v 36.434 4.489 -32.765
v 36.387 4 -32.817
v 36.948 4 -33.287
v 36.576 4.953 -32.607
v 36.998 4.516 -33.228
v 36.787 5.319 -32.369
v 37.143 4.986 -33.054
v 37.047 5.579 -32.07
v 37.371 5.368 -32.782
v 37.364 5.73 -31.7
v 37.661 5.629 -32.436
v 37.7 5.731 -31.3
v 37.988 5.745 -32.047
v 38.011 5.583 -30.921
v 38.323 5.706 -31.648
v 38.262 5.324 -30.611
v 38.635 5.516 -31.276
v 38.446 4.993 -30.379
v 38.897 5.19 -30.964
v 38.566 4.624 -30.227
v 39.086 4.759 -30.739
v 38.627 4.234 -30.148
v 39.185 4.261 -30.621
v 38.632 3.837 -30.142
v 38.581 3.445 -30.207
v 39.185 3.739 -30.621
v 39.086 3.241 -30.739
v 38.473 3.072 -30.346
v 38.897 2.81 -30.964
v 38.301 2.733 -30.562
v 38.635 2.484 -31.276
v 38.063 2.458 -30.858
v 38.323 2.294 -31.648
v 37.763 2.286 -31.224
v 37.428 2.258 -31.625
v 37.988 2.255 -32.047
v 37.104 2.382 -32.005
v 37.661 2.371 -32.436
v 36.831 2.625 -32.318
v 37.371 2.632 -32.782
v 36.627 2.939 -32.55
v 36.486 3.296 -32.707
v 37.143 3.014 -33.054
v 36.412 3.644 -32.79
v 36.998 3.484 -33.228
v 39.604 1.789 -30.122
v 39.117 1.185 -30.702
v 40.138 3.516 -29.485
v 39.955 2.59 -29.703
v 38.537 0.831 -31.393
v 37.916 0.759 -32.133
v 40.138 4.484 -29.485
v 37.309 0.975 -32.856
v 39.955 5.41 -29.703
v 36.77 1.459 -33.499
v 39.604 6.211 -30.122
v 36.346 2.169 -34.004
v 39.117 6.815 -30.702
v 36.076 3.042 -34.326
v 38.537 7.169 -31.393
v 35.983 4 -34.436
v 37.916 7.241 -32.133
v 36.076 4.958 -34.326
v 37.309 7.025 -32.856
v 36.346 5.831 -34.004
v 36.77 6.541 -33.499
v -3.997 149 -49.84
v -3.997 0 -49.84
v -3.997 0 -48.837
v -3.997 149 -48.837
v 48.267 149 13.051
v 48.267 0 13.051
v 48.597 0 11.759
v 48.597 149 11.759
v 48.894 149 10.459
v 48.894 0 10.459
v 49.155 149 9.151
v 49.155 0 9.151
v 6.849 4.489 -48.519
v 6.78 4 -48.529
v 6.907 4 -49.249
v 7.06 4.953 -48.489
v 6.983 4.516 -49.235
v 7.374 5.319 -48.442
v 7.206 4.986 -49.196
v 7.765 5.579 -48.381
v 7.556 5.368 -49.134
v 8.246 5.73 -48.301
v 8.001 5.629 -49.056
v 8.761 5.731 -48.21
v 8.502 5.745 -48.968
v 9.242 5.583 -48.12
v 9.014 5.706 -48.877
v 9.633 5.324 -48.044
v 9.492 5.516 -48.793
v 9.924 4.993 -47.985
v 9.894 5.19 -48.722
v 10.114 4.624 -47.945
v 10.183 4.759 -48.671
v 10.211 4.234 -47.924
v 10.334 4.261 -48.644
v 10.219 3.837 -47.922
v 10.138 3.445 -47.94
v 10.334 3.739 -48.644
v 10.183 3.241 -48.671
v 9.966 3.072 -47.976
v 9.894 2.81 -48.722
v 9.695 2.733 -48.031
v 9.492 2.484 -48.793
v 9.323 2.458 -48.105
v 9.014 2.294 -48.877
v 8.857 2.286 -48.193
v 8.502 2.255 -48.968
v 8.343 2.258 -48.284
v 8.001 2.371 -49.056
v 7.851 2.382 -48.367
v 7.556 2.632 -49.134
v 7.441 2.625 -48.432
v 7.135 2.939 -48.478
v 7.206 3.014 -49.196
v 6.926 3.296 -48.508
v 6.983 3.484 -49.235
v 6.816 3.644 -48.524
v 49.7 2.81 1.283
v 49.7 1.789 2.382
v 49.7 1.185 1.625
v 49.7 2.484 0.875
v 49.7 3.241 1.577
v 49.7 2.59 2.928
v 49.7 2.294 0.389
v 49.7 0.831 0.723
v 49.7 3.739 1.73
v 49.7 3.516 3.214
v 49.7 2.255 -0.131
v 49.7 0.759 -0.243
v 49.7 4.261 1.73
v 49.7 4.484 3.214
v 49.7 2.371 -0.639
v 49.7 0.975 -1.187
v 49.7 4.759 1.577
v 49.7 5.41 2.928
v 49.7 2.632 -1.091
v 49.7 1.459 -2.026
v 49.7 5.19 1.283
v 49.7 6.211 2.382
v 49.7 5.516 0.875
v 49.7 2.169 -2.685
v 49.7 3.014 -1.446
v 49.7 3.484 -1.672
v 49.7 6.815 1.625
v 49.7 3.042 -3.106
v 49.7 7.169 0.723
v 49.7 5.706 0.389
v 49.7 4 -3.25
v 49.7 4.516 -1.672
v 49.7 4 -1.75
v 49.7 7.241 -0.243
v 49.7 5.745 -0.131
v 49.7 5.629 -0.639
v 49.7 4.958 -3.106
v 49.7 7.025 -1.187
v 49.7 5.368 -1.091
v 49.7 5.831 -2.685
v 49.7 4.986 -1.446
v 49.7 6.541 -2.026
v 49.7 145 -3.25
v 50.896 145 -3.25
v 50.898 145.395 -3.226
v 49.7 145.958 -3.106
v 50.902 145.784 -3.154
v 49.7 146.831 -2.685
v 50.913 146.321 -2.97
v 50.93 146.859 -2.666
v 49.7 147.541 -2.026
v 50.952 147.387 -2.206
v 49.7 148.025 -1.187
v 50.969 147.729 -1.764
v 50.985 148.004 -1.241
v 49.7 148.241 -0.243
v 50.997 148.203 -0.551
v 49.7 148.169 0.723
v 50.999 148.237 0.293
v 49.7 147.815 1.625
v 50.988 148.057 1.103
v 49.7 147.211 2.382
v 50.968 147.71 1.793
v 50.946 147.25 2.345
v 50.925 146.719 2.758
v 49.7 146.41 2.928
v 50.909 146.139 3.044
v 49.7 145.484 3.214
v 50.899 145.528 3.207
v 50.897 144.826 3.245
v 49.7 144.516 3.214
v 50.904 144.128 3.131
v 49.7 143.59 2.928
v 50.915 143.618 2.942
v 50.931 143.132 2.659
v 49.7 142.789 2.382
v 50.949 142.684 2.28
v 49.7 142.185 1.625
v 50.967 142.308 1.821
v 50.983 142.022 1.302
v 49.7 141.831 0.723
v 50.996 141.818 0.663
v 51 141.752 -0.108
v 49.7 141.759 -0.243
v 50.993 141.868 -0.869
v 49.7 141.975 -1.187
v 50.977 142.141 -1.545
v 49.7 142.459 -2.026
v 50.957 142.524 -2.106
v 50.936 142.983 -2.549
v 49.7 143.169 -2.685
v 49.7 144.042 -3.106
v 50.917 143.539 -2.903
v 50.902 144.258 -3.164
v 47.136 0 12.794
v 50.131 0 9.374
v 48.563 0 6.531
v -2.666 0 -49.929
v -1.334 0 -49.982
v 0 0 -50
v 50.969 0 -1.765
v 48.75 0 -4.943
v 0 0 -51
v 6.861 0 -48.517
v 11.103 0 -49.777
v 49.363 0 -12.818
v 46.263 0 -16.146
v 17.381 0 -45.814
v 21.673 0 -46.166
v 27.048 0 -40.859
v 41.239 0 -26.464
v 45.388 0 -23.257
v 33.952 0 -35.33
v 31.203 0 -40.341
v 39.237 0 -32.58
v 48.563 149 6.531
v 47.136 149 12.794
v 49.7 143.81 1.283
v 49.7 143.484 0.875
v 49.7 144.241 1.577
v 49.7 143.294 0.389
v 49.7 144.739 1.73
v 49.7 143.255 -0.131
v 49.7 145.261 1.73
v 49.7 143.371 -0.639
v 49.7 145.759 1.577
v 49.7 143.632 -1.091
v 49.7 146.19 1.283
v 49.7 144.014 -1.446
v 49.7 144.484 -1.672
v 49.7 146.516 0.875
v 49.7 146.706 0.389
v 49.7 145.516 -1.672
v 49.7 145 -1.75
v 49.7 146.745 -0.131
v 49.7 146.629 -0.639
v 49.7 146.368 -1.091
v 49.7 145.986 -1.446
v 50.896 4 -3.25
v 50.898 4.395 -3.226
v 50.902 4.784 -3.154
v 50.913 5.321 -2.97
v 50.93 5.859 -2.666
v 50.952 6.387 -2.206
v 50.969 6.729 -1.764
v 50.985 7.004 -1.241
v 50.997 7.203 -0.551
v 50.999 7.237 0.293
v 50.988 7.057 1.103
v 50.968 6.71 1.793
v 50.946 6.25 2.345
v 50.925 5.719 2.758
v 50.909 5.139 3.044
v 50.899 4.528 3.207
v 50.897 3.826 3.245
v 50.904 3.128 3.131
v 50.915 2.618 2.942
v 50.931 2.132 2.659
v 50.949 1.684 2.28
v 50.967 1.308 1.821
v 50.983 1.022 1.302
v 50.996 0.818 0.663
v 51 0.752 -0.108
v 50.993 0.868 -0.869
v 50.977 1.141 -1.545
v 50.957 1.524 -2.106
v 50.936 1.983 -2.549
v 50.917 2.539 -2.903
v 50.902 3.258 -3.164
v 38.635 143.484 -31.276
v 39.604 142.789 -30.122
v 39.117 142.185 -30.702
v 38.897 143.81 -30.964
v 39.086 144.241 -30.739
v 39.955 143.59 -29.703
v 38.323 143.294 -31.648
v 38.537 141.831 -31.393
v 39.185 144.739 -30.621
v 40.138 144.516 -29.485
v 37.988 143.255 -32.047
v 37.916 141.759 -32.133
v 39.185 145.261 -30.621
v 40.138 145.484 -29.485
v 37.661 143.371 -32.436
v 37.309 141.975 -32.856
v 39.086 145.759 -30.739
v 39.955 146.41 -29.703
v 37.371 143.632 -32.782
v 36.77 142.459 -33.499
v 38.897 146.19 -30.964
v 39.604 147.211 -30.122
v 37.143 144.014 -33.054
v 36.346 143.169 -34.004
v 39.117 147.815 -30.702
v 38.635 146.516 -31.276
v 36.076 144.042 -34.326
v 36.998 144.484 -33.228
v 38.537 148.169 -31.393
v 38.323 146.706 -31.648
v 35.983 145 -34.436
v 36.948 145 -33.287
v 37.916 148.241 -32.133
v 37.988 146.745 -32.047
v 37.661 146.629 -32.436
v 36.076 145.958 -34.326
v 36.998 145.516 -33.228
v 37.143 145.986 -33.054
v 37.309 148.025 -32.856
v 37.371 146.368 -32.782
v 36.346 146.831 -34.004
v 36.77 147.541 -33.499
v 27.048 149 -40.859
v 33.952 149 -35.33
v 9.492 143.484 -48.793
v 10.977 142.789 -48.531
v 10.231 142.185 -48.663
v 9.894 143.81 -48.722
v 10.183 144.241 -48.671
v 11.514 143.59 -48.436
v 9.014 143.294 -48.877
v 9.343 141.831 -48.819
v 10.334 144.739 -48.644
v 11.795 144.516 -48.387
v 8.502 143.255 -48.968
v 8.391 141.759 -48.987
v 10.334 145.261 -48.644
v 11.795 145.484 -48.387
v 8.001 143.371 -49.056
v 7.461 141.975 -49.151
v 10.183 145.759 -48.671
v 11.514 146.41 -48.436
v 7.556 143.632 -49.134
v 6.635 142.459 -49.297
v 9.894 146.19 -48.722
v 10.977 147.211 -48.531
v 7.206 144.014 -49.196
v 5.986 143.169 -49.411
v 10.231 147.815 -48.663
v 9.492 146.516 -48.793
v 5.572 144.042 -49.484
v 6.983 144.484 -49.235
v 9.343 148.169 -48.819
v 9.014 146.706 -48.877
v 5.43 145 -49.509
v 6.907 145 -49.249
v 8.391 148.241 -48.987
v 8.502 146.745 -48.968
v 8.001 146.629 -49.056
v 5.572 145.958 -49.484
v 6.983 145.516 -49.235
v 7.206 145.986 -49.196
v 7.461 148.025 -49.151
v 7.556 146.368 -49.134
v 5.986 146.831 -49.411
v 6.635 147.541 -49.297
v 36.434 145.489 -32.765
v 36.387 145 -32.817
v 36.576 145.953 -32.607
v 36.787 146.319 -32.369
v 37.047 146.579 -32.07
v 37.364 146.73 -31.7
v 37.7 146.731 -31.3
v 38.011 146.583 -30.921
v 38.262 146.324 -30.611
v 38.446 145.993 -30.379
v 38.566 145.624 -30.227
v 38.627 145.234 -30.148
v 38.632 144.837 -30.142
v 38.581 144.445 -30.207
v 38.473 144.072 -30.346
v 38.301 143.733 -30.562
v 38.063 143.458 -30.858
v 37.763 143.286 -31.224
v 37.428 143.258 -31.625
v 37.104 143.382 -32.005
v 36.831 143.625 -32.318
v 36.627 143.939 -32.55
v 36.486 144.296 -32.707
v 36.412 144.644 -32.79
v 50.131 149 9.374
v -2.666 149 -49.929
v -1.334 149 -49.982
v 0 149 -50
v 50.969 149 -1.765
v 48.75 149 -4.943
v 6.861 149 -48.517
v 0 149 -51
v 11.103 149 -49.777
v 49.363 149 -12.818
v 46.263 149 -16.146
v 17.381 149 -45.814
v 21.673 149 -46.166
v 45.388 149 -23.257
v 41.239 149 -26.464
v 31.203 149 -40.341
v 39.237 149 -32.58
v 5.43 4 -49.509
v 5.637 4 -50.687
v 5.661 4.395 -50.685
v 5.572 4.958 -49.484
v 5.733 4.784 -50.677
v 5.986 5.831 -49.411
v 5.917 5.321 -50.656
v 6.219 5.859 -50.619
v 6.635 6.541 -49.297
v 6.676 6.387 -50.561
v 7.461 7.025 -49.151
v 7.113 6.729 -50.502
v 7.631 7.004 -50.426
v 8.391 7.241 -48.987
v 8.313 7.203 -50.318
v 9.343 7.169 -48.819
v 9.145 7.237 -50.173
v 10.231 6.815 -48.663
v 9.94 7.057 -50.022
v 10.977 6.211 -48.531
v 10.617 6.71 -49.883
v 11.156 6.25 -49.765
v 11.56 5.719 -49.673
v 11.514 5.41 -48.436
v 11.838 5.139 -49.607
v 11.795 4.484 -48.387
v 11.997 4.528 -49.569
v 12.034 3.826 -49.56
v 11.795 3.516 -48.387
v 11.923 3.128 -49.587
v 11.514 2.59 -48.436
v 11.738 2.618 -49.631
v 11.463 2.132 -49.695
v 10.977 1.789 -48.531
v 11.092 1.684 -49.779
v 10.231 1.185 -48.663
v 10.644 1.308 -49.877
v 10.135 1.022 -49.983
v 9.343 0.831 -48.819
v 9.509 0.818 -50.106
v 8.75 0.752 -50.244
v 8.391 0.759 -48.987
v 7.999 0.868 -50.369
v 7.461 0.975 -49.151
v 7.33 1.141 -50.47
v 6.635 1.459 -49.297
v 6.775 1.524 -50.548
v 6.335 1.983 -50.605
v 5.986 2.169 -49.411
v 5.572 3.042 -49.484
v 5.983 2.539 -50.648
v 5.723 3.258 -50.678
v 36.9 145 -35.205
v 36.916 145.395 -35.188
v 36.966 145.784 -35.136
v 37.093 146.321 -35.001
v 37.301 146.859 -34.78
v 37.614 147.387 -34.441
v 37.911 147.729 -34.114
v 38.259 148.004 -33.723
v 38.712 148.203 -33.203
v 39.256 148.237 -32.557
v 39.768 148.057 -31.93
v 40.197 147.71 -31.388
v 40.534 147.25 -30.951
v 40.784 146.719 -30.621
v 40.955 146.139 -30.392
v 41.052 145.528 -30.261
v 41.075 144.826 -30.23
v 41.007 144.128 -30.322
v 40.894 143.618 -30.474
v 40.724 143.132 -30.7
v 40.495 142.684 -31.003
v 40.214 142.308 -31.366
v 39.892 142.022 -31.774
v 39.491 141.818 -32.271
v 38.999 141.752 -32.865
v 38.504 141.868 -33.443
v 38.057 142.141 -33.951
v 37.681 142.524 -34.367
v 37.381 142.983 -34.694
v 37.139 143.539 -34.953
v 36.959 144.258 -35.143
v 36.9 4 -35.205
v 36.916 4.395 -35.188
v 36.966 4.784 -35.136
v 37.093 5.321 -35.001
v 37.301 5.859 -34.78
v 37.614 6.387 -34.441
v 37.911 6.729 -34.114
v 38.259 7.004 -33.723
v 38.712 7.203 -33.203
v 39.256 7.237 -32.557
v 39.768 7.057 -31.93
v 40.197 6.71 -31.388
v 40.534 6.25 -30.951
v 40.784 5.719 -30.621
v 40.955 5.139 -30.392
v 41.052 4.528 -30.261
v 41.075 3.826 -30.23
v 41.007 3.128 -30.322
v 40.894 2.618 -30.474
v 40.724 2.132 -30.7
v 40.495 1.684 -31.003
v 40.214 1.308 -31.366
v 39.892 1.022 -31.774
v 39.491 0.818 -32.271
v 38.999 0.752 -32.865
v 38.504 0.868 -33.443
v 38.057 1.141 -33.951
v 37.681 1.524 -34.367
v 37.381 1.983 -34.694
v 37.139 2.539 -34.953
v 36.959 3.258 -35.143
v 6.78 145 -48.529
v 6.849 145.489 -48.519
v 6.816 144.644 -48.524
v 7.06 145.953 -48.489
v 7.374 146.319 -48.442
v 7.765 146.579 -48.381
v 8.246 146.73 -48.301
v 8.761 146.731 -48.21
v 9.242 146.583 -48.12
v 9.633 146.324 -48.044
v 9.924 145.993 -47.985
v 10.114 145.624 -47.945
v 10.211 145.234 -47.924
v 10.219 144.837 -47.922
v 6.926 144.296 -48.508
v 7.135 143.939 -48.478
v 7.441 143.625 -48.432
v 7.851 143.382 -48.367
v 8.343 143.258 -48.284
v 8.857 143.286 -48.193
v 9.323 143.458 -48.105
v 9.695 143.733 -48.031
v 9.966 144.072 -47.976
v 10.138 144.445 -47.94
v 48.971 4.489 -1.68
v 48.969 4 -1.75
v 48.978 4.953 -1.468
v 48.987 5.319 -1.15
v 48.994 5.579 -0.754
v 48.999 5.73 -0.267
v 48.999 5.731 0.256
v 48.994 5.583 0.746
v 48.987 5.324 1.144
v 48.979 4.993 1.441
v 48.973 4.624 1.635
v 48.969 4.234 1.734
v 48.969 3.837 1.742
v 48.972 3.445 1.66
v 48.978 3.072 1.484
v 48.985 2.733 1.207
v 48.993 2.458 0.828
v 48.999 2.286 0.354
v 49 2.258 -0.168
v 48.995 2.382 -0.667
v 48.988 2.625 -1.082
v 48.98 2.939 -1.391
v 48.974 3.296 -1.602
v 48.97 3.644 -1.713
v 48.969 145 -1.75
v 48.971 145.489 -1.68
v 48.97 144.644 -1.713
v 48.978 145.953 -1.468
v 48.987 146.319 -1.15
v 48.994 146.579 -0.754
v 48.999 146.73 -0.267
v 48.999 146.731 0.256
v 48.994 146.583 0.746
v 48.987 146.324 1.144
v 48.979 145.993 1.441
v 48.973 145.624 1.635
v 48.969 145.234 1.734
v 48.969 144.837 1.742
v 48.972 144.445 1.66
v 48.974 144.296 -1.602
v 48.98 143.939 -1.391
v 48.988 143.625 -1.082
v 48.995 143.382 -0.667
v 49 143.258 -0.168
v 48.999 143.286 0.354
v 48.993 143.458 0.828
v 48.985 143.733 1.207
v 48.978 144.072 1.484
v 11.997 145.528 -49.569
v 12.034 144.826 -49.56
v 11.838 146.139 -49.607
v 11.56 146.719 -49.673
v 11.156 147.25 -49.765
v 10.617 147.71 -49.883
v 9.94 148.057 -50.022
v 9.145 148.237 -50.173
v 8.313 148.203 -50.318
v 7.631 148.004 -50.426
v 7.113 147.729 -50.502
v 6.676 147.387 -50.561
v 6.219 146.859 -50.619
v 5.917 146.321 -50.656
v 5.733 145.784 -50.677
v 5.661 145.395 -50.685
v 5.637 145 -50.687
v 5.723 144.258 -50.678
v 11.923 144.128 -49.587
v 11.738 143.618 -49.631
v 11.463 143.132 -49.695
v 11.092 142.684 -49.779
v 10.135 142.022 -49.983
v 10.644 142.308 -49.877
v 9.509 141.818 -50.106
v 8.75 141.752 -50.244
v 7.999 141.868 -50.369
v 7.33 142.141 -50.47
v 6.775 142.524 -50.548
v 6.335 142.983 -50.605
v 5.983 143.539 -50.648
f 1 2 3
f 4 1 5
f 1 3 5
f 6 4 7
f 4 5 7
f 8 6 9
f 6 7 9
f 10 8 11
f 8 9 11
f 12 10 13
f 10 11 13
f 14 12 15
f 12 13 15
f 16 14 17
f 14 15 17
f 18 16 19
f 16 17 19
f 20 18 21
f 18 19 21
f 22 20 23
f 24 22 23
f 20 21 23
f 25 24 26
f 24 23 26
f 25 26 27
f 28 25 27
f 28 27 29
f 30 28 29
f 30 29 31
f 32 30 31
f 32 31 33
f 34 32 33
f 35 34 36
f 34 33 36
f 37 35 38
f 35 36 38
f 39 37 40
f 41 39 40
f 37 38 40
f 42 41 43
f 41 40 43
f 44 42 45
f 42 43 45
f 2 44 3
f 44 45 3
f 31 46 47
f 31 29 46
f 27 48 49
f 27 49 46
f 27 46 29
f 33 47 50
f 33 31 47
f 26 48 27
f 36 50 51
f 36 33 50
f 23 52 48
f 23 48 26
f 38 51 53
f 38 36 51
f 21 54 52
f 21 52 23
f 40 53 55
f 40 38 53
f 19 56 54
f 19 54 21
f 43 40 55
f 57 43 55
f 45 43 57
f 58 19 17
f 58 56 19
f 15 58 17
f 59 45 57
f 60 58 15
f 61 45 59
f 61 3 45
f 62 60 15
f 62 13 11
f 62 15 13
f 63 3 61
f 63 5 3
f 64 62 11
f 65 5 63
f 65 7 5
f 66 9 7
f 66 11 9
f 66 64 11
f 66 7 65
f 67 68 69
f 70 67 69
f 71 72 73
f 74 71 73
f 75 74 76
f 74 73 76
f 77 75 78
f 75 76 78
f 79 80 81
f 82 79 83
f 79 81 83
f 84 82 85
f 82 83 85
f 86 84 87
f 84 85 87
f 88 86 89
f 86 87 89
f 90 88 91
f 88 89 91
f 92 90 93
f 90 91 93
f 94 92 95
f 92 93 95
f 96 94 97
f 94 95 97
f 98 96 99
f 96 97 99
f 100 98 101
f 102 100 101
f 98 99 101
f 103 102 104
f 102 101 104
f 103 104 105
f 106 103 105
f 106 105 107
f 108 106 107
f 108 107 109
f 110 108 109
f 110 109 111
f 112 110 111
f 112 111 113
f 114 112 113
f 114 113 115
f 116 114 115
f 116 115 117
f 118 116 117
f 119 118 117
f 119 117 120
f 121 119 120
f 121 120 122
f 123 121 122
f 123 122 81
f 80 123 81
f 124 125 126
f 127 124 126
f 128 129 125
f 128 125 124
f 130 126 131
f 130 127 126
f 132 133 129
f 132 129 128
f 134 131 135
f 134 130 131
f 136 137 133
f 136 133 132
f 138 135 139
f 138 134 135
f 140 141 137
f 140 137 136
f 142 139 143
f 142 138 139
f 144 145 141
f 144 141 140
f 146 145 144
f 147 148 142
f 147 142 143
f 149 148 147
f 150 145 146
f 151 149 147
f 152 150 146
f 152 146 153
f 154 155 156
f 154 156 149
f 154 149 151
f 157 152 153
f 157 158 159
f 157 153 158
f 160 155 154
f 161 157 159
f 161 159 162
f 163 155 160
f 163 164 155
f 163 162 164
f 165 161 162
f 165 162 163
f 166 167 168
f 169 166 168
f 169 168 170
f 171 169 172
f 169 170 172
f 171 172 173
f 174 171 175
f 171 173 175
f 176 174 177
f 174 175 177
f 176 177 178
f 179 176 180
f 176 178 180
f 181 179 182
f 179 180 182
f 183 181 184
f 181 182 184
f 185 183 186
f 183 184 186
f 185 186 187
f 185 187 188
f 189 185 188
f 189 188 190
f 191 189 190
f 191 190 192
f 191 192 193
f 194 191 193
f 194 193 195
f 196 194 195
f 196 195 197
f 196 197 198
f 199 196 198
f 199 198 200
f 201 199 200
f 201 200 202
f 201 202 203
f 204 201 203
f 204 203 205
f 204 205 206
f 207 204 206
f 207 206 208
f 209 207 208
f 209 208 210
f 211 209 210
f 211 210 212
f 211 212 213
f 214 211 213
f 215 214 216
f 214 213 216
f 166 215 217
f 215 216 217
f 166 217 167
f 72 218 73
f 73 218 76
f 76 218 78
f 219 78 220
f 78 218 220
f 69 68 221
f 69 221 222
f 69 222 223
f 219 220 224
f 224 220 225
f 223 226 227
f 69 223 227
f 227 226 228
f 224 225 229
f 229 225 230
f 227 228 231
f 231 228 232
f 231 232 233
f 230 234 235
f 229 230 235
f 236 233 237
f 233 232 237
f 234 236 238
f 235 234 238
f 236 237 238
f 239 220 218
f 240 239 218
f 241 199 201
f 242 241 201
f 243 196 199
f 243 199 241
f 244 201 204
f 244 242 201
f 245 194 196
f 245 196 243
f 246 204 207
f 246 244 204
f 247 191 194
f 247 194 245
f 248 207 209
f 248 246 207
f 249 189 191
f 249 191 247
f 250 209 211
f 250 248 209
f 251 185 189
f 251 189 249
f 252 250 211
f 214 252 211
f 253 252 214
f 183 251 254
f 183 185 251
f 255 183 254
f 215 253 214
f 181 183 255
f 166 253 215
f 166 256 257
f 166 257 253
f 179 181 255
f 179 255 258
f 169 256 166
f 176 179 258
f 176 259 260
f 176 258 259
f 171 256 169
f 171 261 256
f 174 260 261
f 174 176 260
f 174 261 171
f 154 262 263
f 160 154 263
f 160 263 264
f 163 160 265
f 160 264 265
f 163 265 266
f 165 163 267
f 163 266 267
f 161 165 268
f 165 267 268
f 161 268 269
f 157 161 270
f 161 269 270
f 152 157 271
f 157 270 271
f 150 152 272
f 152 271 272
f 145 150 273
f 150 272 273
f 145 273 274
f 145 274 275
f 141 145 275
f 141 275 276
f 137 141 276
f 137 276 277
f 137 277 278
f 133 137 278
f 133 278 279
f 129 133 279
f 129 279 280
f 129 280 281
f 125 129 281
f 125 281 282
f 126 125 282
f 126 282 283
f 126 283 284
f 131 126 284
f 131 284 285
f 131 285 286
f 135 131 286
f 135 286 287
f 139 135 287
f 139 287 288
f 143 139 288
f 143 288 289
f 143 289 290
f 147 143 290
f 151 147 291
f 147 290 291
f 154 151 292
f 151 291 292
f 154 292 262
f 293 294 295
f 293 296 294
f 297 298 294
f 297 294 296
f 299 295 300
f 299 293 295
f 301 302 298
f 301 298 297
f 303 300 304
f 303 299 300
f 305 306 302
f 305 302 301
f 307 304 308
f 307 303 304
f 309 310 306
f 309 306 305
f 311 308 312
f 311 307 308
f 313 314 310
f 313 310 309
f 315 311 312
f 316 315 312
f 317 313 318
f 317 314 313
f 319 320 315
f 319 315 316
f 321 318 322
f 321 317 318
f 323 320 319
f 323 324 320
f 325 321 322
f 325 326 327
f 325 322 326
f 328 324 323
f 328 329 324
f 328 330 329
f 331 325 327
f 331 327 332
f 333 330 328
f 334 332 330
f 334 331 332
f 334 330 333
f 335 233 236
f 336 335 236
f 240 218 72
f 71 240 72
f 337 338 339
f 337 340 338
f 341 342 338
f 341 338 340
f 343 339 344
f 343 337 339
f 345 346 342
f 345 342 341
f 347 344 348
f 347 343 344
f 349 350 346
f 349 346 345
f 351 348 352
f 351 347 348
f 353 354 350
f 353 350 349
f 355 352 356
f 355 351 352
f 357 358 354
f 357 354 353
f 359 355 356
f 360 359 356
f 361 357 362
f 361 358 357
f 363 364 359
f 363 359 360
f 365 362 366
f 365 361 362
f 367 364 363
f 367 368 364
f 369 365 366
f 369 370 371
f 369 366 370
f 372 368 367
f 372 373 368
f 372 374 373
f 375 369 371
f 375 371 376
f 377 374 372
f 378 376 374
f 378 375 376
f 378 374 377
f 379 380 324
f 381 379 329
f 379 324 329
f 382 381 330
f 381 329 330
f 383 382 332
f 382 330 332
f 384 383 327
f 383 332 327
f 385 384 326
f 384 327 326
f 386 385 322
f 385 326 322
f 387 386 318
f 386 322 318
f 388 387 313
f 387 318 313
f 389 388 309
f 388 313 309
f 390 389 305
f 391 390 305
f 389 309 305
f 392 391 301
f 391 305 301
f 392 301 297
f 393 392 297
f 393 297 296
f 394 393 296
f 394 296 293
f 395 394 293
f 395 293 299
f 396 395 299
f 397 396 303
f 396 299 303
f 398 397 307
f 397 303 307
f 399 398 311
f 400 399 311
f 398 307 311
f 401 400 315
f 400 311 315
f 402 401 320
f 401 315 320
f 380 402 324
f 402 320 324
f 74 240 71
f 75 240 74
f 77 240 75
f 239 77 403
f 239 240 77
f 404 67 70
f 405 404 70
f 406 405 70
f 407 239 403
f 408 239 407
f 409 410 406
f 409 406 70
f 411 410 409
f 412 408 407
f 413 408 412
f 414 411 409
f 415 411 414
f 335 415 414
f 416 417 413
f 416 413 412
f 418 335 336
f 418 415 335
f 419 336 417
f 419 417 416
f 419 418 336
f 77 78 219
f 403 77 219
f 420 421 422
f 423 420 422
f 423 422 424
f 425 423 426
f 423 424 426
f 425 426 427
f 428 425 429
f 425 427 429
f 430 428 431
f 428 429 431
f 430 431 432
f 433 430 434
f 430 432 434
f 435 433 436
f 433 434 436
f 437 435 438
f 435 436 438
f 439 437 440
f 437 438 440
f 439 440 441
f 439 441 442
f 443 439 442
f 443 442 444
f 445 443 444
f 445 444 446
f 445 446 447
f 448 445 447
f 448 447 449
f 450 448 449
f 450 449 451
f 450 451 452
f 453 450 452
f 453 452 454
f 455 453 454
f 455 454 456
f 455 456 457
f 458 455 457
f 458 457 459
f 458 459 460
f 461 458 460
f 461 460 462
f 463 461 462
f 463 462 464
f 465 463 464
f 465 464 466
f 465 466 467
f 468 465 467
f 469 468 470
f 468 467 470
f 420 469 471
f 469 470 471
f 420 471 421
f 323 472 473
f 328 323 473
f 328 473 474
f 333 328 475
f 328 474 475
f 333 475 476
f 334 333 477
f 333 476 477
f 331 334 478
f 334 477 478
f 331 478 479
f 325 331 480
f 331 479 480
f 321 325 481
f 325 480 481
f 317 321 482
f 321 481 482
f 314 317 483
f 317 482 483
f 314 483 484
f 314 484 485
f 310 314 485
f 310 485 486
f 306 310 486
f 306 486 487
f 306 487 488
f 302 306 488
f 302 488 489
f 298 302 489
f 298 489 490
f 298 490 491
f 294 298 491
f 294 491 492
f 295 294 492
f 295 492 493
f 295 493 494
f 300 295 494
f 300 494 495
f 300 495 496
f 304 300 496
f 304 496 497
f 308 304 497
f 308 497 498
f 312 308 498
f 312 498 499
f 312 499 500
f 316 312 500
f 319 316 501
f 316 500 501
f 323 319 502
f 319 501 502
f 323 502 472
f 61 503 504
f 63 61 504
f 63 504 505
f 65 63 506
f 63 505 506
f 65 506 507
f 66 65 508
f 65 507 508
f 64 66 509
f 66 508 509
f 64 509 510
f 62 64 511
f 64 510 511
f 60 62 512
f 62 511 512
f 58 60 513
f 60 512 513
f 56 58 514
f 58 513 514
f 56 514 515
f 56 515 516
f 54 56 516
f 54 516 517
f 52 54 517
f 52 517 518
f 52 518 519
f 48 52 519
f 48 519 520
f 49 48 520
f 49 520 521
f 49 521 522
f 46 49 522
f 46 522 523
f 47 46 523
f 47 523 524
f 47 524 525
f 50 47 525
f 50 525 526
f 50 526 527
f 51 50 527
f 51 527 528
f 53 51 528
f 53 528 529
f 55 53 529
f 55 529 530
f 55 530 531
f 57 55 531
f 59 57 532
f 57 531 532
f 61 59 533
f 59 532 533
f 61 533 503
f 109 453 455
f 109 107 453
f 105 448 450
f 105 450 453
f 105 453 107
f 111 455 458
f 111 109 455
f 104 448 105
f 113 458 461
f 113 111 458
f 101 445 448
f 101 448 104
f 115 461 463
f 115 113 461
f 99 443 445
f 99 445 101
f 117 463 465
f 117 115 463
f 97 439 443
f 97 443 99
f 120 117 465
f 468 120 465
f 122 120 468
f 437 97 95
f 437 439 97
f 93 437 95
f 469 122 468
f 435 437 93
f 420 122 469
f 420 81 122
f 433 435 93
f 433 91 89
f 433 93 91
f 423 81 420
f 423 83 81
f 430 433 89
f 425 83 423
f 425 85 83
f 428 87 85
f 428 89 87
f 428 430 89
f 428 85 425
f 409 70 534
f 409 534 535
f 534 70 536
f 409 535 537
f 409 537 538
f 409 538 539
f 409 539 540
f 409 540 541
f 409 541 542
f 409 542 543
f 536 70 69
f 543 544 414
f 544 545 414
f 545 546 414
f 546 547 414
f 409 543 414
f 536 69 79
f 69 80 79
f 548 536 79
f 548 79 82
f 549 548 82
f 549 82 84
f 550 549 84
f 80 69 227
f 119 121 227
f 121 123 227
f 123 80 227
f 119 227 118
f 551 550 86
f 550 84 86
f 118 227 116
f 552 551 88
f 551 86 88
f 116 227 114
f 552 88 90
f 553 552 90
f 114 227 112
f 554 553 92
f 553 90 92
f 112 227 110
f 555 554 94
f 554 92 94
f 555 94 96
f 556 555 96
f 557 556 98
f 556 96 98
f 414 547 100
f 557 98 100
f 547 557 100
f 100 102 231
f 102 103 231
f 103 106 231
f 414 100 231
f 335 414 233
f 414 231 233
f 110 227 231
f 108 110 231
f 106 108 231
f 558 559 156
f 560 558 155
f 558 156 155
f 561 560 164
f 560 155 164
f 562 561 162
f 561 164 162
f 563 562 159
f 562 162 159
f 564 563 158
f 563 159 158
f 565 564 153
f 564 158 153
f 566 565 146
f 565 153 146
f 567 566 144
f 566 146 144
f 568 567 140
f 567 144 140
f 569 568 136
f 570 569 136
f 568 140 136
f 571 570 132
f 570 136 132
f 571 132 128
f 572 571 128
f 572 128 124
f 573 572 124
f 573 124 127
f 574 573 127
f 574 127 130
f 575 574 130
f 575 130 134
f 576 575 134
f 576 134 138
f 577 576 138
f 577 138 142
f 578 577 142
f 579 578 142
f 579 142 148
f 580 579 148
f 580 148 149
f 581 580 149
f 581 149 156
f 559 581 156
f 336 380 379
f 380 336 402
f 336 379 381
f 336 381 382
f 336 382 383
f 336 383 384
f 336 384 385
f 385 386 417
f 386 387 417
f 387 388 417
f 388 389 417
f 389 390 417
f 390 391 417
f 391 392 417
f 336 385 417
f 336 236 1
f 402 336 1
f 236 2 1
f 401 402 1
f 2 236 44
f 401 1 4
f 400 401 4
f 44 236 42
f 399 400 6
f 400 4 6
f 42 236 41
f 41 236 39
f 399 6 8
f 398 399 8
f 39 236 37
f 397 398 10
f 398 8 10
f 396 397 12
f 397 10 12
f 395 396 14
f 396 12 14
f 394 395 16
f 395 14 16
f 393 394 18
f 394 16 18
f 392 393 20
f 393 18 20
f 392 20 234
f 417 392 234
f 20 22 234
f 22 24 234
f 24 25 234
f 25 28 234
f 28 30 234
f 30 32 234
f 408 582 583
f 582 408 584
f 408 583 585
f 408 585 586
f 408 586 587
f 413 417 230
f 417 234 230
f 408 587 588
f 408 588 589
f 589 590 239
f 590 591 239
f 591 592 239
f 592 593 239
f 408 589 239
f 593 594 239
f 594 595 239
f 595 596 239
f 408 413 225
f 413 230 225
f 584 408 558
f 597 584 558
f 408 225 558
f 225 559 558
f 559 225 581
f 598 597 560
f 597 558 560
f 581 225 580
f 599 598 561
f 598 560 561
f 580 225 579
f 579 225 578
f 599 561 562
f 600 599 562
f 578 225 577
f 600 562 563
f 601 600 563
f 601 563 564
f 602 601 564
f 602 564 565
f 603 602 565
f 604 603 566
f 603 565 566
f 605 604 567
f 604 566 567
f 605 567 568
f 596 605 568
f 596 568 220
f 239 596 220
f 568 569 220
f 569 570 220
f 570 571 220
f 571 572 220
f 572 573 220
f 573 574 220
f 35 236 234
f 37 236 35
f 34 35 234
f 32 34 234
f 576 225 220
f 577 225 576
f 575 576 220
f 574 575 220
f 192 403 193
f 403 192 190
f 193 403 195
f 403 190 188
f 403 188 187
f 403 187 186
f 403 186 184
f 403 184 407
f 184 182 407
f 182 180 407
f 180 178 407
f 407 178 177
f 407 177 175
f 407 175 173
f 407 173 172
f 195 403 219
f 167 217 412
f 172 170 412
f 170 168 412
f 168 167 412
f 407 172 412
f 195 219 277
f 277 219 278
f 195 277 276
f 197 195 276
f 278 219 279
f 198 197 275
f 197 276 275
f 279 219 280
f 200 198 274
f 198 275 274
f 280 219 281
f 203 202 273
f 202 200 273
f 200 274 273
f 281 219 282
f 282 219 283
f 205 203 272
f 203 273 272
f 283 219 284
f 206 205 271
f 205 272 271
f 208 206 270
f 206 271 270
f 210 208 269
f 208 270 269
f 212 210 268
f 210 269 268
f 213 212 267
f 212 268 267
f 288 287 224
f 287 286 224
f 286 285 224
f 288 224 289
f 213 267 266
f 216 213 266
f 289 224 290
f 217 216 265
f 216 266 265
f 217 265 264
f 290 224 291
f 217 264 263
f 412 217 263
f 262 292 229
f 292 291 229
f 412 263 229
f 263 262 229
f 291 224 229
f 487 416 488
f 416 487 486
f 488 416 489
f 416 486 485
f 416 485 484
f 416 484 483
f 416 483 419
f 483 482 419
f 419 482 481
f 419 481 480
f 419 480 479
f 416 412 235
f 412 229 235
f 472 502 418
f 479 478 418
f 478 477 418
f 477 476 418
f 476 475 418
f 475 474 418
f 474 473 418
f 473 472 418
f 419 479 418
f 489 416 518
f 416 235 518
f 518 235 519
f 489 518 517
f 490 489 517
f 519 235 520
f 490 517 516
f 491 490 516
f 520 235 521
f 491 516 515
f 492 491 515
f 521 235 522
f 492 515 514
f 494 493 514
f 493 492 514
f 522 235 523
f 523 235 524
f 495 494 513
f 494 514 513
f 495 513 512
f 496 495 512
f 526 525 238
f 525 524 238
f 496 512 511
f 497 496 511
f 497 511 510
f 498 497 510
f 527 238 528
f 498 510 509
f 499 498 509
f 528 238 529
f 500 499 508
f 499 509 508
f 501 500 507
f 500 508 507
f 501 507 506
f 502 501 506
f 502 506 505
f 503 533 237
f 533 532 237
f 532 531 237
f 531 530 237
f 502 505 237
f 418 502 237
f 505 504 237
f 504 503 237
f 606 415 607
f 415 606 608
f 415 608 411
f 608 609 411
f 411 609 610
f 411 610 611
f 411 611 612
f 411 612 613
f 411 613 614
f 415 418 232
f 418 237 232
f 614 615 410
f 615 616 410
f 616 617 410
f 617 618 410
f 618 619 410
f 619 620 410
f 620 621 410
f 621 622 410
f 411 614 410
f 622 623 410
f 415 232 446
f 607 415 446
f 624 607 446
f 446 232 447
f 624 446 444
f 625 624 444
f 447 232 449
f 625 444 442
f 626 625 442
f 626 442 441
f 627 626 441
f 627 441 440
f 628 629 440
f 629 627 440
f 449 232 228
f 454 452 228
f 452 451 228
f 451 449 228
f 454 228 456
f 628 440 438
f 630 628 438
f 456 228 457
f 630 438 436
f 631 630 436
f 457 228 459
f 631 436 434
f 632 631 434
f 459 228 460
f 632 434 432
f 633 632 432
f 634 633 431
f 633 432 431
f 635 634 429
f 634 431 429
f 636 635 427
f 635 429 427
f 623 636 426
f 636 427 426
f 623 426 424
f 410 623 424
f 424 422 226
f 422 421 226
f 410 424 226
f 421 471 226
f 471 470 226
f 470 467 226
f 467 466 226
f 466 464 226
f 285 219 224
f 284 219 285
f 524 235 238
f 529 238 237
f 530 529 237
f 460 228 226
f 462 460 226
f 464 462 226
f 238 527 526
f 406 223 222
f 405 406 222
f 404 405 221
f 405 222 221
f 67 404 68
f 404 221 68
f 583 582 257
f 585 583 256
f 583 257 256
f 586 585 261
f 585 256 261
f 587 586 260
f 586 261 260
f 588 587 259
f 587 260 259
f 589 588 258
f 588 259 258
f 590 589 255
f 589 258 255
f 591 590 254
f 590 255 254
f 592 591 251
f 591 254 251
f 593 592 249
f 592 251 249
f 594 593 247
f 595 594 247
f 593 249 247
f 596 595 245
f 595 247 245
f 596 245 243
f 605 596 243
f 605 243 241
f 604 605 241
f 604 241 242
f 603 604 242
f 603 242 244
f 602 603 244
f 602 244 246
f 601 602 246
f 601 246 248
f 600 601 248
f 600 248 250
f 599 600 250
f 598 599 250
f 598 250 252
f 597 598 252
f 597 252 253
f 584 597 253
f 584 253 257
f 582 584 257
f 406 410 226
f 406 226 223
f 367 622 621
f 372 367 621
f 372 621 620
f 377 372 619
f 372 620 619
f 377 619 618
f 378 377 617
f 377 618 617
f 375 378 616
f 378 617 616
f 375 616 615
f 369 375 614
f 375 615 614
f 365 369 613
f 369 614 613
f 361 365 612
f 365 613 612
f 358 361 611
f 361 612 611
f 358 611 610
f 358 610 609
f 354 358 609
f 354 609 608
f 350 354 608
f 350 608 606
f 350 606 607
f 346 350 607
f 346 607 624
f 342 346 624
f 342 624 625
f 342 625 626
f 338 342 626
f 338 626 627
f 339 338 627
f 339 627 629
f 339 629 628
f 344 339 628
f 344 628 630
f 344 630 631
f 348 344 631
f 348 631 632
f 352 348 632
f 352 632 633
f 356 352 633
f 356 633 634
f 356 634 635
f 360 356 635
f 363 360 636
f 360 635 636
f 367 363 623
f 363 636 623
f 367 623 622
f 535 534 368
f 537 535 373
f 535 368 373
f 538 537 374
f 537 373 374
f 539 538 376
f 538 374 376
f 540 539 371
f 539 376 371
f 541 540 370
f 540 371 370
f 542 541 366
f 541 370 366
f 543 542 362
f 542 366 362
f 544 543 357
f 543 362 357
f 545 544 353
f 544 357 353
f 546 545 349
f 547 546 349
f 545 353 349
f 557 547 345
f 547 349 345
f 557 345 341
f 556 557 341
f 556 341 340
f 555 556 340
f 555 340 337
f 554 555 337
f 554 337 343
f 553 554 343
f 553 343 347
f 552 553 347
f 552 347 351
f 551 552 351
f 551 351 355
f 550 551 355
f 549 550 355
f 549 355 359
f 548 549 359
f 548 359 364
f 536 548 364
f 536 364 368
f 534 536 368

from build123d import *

# Parameters (mm, degrees)
EXTRUDE_2_DEPTH          = 149
SKETCH_15_R              = 3.25
CUT_EXTRUDE_5_DEPTH      = 1.3
SKETCH_16_R              = 1.75
CUT_EXTRUDE_6_DEPTH      = 167.38914097
PATTERN_CIRCULAR_3_COUNT = 5
PATTERN_CIRCULAR_3_ANGLE = 80
SKETCH_17_R              = 3.25
CUT_EXTRUDE_7_DEPTH      = 1.3
SKETCH_18_R              = 1.75
CUT_EXTRUDE_8_DEPTH      = 167.389141002
PATTERN_CIRCULAR_5_COUNT = 5
PATTERN_CIRCULAR_5_ANGLE = 80


with BuildPart() as part:
    # Эскиз2 → Бобышка-Вытянуть2 (new body)
    with BuildSketch(Plane(origin=(0, 0, 0), x_dir=(1, 0, 0), z_dir=(0, 1, 0))):
        with BuildLine():
            Line((47.135590279, -12.793597189), (48.266574667, -13.051351269))
            ThreePointArc((48.266574667, -13.051351269), (48.75, -11.110243022), (49.155394108, -9.151351269))
            Line((49.155394108, -9.151351269), (50.131159715, -9.373730613))
            ThreePointArc((50.131159715, -9.373730613), (39.236846594, 32.580206711), (0, 51))
            Line((0, 51), (0, 50))
            ThreePointArc((0, 50), (-2, 49.959983987), (-3.996798719, 49.84))
            Line((-3.996798719, 49.84), (-3.996798719, 48.836723887))
            ThreePointArc((-3.996798719, 48.836723887), (12.196177114, 47.457910445), (27.047555214, 40.858655839))
            Line((27.047555214, 40.858655839), (33.952444786, 35.330319742))
            ThreePointArc((33.952444786, 35.330319742), (46.263287314, 16.146462365), (48.562738521, -6.531495034))
            Line((48.562738521, -6.531495034), (47.135590279, -12.793597189))
        make_face()
    extrude(amount=EXTRUDE_2_DEPTH)

    # Эскиз15 → Вырез-Вытянуть5 (cut)
    with BuildSketch(Plane(origin=(51, 0, 0), x_dir=(0, 0, -1), z_dir=(1, 0, 0))):
        with Locations((0, 4)):
            Circle(SKETCH_15_R)
    cut_extrude_5 = extrude(amount=-CUT_EXTRUDE_5_DEPTH, mode=Mode.SUBTRACT)

    # Эскиз16 → Вырез-Вытянуть6 (cut, through all)
    with BuildSketch(Plane(origin=(49.7, 0, 0), x_dir=(0, 0, -1), z_dir=(1, 0, 0))):
        with Locations((0, 4)):
            Circle(SKETCH_16_R)
    cut_extrude_6 = extrude(amount=-CUT_EXTRUDE_6_DEPTH, mode=Mode.SUBTRACT)

    # Круговой массив3: Вырез-Вытянуть5, Вырез-Вытянуть6 ×5 about axis, 2 skipped
    pattern_circular_3_axis = Axis((0, 0, 0), (0, 1, 0))
    add([cut_extrude_5.rotate(pattern_circular_3_axis, i * PATTERN_CIRCULAR_3_ANGLE / (PATTERN_CIRCULAR_3_COUNT - 1)) for i in range(1, PATTERN_CIRCULAR_3_COUNT) if i not in (1, 3)], mode=Mode.SUBTRACT)
    add([cut_extrude_6.rotate(pattern_circular_3_axis, i * PATTERN_CIRCULAR_3_ANGLE / (PATTERN_CIRCULAR_3_COUNT - 1)) for i in range(1, PATTERN_CIRCULAR_3_COUNT) if i not in (1, 3)], mode=Mode.SUBTRACT)

    # Эскиз17 → Вырез-Вытянуть7 (cut)
    with BuildSketch(Plane(origin=(51, 0, 0), x_dir=(0, 0, -1), z_dir=(1, 0, 0))):
        with Locations((0, 145)):
            Circle(SKETCH_17_R)
    cut_extrude_7 = extrude(amount=-CUT_EXTRUDE_7_DEPTH, mode=Mode.SUBTRACT)

    # Эскиз18 → Вырез-Вытянуть8 (cut, through all)
    with BuildSketch(Plane(origin=(49.7, 0, 0), x_dir=(0, 0, -1), z_dir=(1, 0, 0))):
        with Locations((0, 145)):
            Circle(SKETCH_18_R)
    cut_extrude_8 = extrude(amount=-CUT_EXTRUDE_8_DEPTH, mode=Mode.SUBTRACT)

    # Круговой массив5: Вырез-Вытянуть7, Вырез-Вытянуть8 ×5 about axis, 2 skipped
    pattern_circular_5_axis = Axis((0, 149, 0), (0, 1, 0))
    add([cut_extrude_7.rotate(pattern_circular_5_axis, i * PATTERN_CIRCULAR_5_ANGLE / (PATTERN_CIRCULAR_5_COUNT - 1)) for i in range(1, PATTERN_CIRCULAR_5_COUNT) if i not in (1, 3)], mode=Mode.SUBTRACT)
    add([cut_extrude_8.rotate(pattern_circular_5_axis, i * PATTERN_CIRCULAR_5_ANGLE / (PATTERN_CIRCULAR_5_COUNT - 1)) for i in range(1, PATTERN_CIRCULAR_5_COUNT) if i not in (1, 3)], mode=Mode.SUBTRACT)


solid = part.part
